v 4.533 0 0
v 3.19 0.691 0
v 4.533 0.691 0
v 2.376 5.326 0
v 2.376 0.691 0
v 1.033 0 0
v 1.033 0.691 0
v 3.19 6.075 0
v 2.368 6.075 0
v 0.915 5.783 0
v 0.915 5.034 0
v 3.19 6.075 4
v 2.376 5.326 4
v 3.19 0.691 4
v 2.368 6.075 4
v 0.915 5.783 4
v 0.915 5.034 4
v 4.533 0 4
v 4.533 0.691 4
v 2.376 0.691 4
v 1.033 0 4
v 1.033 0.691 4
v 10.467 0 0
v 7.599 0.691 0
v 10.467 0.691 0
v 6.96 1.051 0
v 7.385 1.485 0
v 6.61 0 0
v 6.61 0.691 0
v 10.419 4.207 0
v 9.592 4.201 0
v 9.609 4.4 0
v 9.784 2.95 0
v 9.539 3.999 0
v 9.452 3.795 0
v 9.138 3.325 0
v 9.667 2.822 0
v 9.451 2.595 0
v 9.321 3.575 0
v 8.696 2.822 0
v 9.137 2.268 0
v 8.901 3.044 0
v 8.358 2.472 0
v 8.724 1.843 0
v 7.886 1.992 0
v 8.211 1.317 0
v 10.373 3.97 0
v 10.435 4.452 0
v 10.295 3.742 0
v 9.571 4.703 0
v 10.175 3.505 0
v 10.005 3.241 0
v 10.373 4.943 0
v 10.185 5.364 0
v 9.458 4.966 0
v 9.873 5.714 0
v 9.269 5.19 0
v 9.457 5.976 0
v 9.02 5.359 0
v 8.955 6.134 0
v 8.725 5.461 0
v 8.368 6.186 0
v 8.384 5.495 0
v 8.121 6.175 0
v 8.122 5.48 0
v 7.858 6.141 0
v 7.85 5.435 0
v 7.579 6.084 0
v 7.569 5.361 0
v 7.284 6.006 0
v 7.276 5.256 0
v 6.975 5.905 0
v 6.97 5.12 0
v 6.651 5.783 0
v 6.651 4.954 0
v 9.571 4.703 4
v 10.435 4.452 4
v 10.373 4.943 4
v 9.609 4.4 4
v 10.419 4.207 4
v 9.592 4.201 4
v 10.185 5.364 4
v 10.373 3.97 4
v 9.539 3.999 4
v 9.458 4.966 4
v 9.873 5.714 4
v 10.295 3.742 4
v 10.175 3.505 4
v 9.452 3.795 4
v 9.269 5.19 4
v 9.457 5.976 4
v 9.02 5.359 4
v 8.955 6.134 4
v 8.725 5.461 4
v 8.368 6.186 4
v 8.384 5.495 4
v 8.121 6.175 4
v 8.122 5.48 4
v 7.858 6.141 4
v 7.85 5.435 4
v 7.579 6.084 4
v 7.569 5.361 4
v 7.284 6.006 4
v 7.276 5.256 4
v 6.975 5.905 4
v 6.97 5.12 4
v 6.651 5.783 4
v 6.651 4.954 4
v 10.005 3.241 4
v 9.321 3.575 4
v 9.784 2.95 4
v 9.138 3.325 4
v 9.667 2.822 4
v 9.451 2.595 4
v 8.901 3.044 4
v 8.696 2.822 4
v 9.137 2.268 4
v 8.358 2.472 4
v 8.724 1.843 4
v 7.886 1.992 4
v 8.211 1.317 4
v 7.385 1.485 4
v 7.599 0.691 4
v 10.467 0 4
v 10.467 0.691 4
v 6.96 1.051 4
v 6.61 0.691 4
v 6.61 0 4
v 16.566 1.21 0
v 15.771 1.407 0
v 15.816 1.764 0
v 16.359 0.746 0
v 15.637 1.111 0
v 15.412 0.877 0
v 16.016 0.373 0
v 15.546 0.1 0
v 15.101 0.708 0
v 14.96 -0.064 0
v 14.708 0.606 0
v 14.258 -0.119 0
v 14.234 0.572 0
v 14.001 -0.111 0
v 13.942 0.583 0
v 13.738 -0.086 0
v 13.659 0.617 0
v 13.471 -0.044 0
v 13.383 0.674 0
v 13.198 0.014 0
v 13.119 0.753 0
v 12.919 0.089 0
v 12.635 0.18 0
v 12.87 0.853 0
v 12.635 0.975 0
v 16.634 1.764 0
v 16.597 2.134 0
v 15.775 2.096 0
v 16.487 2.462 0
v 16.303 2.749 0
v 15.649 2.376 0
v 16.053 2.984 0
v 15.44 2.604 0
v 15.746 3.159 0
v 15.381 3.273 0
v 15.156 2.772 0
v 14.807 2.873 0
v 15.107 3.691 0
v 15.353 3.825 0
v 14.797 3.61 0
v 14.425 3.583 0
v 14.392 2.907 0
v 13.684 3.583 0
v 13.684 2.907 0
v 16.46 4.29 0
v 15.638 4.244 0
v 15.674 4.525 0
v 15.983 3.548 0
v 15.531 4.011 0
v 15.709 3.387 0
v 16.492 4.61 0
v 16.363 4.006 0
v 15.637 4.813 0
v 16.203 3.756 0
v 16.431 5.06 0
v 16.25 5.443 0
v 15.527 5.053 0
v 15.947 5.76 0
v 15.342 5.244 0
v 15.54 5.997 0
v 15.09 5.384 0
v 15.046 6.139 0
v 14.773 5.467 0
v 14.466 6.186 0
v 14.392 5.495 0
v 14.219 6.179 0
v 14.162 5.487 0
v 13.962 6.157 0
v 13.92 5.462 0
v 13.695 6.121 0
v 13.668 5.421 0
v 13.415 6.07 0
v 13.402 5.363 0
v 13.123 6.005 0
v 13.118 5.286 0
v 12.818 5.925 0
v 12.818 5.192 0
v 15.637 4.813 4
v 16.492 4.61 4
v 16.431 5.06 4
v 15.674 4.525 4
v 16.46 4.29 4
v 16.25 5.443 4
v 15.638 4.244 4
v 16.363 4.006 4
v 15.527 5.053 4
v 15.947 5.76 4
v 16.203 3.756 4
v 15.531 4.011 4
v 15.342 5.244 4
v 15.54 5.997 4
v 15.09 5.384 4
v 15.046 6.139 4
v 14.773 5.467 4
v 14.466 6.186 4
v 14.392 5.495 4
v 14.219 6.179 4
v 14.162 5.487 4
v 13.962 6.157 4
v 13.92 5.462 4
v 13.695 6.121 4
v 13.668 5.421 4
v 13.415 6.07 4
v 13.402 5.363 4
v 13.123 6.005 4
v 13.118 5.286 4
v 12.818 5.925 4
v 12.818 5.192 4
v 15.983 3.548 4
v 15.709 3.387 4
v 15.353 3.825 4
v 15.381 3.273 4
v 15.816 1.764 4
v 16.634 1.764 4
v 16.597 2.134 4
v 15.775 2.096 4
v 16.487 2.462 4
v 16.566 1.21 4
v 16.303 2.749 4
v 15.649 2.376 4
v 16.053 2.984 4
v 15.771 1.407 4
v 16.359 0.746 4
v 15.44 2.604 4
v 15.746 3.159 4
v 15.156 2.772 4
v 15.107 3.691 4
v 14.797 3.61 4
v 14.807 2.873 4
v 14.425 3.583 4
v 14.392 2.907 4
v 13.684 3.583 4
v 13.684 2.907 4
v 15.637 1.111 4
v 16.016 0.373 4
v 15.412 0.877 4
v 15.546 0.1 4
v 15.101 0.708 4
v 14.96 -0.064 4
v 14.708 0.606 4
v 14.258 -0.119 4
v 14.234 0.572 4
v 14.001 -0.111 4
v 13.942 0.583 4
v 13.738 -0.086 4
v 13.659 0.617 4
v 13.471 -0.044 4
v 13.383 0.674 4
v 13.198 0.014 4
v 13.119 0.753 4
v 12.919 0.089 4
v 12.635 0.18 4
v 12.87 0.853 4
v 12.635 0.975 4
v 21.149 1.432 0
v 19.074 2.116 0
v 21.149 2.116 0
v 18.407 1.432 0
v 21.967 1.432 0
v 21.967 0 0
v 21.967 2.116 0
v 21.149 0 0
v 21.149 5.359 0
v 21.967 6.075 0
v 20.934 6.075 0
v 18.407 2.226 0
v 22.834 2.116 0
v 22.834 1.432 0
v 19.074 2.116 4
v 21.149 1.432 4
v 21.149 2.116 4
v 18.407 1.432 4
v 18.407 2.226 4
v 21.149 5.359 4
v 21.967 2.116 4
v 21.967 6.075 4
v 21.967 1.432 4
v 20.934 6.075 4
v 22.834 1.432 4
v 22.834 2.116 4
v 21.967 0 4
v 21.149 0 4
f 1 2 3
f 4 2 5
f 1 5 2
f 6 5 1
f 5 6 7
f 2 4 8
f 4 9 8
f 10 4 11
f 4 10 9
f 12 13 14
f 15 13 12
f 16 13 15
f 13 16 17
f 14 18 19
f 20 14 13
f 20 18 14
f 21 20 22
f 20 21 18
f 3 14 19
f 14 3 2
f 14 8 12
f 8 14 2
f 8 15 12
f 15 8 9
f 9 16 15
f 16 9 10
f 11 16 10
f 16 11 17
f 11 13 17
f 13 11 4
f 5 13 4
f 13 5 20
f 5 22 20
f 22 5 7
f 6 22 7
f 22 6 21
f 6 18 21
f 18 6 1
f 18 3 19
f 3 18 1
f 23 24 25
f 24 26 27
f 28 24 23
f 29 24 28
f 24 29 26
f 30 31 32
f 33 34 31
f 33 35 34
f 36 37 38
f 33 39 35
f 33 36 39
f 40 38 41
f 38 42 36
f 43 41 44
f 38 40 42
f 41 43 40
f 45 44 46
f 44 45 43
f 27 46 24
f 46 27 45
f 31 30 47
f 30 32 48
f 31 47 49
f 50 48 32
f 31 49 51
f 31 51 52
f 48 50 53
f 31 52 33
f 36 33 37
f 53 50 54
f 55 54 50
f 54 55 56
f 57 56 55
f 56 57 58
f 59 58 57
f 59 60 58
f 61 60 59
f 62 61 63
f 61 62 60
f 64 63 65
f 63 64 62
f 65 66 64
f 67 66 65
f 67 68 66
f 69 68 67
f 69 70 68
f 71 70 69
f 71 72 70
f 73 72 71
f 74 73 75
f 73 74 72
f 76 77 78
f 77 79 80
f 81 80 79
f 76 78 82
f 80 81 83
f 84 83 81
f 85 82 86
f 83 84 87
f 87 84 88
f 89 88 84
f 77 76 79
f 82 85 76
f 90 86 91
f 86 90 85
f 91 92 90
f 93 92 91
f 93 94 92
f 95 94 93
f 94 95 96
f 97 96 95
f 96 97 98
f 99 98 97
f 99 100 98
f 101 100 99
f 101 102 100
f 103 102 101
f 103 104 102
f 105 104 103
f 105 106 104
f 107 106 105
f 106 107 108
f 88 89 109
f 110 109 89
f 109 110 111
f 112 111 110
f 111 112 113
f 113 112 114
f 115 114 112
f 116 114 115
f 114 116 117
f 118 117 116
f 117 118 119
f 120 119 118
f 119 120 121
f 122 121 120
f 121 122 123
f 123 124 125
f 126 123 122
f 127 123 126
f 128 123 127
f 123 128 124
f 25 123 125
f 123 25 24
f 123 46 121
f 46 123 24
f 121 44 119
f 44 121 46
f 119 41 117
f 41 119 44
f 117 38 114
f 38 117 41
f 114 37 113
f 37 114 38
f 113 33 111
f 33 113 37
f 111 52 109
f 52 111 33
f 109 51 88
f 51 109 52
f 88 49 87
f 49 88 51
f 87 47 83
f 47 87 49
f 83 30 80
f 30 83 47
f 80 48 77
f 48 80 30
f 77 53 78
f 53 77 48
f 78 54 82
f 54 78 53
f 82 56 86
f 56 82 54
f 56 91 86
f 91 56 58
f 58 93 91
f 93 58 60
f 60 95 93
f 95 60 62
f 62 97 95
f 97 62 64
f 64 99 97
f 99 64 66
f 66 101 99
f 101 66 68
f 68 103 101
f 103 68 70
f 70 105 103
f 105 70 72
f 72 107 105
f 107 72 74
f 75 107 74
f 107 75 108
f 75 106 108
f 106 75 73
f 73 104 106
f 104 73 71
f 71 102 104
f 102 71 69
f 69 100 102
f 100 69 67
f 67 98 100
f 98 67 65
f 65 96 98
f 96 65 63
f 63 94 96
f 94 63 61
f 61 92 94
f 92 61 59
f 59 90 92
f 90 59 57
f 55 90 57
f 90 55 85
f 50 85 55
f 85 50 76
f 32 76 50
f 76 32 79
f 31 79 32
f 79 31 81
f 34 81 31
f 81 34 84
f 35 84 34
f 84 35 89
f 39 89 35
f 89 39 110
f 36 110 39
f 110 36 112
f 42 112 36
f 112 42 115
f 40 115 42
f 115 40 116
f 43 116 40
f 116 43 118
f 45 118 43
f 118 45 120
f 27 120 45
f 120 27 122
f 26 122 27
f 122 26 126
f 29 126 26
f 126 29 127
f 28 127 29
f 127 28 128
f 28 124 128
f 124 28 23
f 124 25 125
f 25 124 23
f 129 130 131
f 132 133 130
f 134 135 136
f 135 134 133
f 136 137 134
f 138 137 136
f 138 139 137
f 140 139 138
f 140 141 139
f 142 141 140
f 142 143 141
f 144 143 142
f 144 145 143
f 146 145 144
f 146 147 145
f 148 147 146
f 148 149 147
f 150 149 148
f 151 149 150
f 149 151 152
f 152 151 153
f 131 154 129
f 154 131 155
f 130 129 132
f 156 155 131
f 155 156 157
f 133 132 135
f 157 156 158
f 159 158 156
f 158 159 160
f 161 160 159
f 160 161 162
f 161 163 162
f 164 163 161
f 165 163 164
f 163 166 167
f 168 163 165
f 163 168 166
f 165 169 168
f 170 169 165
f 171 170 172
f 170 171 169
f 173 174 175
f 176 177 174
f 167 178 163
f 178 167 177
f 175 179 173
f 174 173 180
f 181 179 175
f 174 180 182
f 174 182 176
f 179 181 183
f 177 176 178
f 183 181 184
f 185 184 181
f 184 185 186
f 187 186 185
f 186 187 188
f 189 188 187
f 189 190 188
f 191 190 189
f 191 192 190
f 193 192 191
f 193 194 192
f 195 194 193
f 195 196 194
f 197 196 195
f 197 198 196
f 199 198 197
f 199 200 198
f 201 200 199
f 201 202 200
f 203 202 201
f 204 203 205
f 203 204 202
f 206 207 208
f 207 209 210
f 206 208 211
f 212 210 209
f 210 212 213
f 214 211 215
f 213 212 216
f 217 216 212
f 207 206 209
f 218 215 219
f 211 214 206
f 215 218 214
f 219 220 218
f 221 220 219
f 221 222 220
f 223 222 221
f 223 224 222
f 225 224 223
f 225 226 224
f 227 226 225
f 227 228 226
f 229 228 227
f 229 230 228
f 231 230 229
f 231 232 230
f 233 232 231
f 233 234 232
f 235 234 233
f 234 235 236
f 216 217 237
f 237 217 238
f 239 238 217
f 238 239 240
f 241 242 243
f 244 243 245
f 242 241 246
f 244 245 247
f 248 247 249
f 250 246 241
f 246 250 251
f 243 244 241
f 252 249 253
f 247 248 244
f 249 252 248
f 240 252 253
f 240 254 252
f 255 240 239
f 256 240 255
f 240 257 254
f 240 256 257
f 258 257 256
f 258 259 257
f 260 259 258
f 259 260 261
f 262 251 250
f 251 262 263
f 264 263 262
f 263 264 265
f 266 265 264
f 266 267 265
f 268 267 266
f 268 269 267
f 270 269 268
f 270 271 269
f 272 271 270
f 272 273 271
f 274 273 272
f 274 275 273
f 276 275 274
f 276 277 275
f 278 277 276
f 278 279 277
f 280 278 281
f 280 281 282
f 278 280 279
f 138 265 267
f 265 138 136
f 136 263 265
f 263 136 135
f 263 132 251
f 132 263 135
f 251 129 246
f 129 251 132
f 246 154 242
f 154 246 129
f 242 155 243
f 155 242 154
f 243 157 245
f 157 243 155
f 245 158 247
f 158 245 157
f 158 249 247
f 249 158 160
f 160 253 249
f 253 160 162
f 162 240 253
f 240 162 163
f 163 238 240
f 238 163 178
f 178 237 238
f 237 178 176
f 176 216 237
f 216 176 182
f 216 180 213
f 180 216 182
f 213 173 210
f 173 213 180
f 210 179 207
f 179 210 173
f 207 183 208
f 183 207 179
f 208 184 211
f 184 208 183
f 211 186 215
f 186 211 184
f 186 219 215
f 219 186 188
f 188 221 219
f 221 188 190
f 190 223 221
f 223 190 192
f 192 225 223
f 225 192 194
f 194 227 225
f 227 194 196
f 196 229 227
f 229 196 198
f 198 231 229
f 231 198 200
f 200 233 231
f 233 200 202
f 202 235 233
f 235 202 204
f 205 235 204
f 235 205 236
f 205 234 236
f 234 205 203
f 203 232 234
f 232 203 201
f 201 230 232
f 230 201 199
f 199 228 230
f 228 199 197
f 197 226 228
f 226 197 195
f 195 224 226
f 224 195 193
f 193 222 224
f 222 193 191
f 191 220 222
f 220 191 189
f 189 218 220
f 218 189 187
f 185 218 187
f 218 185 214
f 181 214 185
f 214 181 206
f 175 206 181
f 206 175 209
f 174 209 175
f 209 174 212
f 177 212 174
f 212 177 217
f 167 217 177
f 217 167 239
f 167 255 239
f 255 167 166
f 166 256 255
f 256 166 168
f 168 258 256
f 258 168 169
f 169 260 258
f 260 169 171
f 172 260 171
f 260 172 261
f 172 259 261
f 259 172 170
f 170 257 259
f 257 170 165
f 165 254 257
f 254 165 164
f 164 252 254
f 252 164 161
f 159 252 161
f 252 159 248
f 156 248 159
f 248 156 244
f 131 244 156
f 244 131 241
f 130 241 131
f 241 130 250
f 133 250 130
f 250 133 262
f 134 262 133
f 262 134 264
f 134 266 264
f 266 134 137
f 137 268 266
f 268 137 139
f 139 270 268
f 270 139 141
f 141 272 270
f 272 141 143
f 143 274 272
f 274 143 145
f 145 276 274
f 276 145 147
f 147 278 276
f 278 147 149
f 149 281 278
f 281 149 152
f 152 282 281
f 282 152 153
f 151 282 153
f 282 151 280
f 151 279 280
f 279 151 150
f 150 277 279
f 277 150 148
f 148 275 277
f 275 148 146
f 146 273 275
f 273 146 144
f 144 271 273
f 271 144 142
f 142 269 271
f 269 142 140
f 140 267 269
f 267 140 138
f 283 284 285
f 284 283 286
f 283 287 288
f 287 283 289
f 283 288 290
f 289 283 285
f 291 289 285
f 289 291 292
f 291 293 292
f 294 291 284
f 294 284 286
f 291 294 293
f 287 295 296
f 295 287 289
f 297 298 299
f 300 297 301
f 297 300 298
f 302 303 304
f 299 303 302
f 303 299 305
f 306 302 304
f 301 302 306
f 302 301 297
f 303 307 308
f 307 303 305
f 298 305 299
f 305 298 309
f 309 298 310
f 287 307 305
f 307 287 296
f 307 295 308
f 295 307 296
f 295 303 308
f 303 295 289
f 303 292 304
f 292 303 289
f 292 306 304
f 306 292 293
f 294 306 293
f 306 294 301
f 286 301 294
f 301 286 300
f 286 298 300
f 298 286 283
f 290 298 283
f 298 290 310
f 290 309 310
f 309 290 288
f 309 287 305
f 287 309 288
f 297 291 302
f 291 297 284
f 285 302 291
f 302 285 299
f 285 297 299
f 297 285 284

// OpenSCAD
font = "Bauhaus 93:style=Regular";
strings = [["ABC", "1234", "QRS"], ["+-=", "foo", "bar"]];

oneString = strings[0][1];
echo(oneString);

endIndex = len(oneString) - 1;
for(i = [0 : endIndex])
{
    element = oneString;
    
    // print a single character
    ch = element[i];
    echo(ch);
    
    translate([i*6, 0, 0])
    linear_extrude(height=4)
    text(ch, font=font, size=6);
}
